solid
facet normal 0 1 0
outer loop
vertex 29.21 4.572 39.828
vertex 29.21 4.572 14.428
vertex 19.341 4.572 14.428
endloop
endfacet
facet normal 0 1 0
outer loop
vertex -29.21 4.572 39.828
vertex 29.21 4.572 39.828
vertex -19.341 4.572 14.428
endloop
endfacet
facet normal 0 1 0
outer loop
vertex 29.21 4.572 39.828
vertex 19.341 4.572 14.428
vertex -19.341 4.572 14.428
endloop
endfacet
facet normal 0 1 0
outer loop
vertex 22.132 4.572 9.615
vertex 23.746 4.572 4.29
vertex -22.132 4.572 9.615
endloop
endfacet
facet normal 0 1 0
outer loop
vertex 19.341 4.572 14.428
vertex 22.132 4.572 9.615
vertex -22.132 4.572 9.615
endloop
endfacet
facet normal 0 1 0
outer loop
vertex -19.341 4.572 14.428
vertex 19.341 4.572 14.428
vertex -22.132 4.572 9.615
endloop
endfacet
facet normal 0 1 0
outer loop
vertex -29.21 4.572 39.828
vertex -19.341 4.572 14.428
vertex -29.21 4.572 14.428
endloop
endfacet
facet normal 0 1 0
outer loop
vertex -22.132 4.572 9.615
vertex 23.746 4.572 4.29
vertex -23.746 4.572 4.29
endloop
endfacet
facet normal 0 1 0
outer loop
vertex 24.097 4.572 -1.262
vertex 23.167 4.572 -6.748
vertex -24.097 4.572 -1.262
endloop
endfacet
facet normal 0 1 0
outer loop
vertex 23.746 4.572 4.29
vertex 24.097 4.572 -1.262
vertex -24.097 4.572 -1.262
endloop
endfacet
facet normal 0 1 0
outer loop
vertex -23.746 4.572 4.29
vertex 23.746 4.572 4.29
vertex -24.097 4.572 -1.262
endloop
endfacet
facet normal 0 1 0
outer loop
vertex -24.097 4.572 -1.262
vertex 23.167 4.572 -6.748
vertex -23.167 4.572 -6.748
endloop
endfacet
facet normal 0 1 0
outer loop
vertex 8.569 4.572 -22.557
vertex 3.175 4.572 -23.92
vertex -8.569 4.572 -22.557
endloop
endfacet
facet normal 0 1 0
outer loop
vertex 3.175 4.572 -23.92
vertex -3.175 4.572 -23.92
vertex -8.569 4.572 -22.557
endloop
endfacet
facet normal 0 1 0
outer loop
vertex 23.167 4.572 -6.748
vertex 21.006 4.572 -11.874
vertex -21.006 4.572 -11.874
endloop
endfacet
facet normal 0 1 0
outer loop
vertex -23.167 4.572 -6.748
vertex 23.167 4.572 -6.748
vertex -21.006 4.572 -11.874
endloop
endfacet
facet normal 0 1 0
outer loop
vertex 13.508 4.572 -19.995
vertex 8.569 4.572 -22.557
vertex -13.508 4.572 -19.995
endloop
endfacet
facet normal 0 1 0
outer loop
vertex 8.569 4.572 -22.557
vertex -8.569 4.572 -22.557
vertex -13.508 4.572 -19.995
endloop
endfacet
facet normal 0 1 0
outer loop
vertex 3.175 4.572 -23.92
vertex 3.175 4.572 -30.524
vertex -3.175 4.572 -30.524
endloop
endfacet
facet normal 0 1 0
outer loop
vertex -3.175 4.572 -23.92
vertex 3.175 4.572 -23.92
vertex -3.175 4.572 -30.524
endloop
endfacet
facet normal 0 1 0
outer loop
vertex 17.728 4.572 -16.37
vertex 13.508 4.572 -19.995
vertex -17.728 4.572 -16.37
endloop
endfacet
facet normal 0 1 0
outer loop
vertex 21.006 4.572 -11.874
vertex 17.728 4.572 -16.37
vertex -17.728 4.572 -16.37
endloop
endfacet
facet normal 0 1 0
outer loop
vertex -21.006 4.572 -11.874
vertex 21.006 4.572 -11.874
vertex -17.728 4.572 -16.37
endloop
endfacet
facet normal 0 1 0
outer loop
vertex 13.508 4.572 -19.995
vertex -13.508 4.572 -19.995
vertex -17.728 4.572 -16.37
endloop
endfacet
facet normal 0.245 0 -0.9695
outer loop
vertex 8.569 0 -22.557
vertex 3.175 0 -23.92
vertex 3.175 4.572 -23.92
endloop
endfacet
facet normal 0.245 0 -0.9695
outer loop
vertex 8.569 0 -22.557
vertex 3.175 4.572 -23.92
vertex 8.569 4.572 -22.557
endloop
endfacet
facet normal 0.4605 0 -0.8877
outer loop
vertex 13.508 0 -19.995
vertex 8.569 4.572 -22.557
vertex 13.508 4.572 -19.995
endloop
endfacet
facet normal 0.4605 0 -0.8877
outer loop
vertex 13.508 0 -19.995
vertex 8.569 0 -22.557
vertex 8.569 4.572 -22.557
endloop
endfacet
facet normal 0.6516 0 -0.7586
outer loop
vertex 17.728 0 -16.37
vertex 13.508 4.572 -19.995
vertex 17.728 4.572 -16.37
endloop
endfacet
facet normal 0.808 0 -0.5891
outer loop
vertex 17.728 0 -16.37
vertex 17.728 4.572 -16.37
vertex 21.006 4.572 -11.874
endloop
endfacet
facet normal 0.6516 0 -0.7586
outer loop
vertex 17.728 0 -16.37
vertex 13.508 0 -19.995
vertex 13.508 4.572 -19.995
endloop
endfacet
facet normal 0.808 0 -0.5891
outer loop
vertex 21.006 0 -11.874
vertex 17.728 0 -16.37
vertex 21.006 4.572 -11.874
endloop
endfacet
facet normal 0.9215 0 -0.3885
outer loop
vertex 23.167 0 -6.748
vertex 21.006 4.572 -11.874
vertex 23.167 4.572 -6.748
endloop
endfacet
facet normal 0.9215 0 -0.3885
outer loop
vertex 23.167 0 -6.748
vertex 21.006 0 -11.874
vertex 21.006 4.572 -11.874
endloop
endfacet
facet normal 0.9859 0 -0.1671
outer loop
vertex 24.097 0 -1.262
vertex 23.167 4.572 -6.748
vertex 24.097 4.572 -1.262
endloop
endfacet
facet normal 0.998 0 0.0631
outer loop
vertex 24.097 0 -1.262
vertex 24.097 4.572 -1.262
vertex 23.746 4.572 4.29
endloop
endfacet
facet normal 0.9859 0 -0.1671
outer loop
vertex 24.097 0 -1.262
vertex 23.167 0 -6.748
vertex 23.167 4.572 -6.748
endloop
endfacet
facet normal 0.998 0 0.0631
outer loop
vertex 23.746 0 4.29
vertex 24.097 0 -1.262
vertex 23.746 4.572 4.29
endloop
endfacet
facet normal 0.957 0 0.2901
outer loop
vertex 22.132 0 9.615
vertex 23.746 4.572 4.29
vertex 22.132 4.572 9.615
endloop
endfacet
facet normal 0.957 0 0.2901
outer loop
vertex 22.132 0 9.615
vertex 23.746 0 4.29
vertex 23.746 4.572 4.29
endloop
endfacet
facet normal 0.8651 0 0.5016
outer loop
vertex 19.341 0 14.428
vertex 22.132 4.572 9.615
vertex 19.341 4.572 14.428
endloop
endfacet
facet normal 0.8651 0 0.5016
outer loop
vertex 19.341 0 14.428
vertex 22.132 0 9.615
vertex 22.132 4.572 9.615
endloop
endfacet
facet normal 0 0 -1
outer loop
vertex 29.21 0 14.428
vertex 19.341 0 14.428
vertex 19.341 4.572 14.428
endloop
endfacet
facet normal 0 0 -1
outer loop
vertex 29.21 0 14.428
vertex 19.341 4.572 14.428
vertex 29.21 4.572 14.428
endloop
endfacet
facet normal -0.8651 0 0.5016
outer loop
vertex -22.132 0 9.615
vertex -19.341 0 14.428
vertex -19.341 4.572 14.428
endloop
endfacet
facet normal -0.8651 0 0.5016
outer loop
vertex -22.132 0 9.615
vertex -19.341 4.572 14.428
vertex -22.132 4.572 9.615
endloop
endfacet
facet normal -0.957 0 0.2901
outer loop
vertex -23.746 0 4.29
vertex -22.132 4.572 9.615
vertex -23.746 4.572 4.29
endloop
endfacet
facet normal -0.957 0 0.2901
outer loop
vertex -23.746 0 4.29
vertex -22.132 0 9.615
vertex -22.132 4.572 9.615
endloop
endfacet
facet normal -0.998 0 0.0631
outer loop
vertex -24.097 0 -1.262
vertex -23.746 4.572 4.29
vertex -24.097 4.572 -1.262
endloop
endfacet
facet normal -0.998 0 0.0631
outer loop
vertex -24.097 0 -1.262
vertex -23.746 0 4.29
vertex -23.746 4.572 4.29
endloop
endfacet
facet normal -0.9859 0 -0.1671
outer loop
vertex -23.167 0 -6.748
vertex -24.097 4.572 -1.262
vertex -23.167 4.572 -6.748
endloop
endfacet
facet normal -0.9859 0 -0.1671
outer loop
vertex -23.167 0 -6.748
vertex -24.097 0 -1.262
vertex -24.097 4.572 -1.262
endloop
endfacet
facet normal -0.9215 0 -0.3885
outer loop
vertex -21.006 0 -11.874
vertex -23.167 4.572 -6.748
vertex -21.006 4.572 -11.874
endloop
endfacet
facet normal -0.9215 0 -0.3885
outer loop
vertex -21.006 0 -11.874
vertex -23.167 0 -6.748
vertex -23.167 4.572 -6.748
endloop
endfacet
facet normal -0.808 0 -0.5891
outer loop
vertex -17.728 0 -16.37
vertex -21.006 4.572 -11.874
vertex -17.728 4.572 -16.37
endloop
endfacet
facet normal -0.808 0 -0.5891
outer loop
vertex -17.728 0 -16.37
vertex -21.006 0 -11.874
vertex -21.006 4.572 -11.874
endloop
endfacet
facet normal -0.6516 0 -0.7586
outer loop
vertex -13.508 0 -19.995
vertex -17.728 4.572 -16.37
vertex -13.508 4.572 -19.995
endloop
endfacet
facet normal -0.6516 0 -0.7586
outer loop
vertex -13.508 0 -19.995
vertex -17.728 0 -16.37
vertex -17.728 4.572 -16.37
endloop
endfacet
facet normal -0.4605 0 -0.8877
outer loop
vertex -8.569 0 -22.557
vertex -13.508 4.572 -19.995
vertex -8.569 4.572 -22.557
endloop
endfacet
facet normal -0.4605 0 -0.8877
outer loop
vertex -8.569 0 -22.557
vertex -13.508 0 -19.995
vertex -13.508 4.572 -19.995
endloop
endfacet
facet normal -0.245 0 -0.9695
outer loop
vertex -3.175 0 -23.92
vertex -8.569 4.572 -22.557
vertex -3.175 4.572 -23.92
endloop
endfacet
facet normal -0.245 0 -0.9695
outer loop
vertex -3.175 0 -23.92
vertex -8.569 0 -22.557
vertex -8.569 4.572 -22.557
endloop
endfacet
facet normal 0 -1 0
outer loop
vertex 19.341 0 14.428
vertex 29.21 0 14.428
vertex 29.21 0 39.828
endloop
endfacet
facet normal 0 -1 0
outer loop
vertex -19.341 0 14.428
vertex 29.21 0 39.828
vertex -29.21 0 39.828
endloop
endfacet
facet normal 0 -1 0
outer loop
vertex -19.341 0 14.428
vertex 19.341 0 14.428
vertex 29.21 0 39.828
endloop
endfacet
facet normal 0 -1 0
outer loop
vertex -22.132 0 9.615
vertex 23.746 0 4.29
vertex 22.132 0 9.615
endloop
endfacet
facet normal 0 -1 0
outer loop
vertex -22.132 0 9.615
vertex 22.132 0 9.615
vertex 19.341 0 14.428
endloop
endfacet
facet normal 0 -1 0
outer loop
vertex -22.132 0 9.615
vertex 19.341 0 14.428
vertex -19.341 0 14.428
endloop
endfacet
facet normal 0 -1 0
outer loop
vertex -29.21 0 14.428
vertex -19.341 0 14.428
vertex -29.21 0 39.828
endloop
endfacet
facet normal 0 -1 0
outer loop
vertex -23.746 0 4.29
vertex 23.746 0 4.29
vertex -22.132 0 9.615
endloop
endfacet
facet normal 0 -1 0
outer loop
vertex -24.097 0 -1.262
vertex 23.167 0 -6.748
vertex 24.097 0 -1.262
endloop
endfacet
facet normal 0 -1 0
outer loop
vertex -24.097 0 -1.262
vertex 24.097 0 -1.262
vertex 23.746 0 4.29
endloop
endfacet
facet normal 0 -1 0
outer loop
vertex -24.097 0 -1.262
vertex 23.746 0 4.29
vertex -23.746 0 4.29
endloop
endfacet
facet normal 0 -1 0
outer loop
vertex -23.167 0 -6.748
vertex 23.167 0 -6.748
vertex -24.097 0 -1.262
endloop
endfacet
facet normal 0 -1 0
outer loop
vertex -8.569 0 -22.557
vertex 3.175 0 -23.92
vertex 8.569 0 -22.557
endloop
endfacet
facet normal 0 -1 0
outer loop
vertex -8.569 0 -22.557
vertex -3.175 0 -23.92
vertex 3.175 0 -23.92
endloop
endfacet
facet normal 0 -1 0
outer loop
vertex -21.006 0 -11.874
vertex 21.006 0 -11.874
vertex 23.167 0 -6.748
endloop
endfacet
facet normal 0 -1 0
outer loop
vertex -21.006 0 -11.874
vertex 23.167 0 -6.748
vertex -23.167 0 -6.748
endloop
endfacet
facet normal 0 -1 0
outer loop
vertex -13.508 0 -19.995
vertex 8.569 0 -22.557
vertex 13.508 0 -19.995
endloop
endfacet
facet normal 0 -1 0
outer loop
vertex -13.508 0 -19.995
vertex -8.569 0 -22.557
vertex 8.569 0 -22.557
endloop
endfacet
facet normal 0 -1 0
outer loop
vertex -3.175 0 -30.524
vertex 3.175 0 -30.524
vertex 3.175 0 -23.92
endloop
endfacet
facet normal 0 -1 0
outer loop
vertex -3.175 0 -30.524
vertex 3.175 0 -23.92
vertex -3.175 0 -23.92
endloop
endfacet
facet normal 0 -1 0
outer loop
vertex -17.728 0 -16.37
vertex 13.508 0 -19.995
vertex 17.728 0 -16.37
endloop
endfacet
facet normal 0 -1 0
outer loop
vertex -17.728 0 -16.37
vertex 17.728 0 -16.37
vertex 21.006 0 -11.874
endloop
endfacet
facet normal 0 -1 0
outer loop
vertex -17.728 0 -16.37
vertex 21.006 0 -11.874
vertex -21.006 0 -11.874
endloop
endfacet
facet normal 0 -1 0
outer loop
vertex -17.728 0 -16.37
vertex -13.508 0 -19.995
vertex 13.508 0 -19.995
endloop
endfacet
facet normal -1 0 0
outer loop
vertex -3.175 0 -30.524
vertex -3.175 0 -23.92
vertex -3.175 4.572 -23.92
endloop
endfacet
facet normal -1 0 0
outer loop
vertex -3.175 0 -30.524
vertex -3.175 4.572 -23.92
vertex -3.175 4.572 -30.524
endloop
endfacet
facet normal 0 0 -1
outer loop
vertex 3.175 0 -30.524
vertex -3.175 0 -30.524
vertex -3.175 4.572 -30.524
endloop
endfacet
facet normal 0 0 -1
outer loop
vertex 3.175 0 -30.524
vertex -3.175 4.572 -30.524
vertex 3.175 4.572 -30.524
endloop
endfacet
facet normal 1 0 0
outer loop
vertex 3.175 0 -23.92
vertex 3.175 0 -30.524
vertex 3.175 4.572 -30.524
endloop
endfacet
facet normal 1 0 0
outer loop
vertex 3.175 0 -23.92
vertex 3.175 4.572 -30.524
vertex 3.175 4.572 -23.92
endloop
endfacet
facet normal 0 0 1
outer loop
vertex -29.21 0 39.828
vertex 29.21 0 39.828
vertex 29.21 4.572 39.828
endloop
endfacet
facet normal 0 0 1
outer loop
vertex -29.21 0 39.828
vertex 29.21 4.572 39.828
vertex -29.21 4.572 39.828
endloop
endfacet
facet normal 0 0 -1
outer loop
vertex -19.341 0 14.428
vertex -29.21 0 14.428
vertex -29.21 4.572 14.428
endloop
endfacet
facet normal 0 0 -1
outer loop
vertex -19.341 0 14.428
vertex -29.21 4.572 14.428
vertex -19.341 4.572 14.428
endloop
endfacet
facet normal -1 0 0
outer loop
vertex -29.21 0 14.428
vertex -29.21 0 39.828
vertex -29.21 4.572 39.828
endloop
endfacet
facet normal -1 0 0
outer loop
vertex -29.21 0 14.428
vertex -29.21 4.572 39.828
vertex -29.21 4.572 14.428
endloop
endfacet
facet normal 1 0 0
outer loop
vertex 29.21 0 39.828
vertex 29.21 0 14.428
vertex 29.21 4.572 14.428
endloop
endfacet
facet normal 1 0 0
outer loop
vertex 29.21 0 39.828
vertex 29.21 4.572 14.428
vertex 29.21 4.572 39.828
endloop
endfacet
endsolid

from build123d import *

# Parameters (mm, degrees)
BOSS_EXTRUDE1_DEPTH = 4.572


with BuildPart() as part:
    # Sketch1 → Boss-Extrude1 (new body)
    with BuildSketch(Plane(origin=(0, 0, 0), x_dir=(1, 0, 0), z_dir=(0, 1, 0))):
        with BuildLine():
            Line((-3.175, 30.524206416), (3.175, 30.524206416))
            Line((3.175, 30.524206416), (3.175, 23.920206416))
            ThreePointArc((3.175, 23.920206416), (22.234995228, 9.373467192), (19.341279759, -14.428159872))
            Line((19.341279759, -14.428159872), (29.21, -14.428159872))
            Line((29.21, -14.428159872), (29.21, -39.828159872))
            Line((29.21, -39.828159872), (-29.21, -39.828159872))
            Line((-29.21, -39.828159872), (-29.21, -14.428159872))
            Line((-29.21, -14.428159872), (-19.341279759, -14.428159872))
            ThreePointArc((-19.341279759, -14.428159872), (-22.234995228, 9.373467192), (-3.175, 23.920206416))
            Line((-3.175, 23.920206416), (-3.175, 30.524206416))
        make_face()
    extrude(amount=BOSS_EXTRUDE1_DEPTH)


solid = part.part
